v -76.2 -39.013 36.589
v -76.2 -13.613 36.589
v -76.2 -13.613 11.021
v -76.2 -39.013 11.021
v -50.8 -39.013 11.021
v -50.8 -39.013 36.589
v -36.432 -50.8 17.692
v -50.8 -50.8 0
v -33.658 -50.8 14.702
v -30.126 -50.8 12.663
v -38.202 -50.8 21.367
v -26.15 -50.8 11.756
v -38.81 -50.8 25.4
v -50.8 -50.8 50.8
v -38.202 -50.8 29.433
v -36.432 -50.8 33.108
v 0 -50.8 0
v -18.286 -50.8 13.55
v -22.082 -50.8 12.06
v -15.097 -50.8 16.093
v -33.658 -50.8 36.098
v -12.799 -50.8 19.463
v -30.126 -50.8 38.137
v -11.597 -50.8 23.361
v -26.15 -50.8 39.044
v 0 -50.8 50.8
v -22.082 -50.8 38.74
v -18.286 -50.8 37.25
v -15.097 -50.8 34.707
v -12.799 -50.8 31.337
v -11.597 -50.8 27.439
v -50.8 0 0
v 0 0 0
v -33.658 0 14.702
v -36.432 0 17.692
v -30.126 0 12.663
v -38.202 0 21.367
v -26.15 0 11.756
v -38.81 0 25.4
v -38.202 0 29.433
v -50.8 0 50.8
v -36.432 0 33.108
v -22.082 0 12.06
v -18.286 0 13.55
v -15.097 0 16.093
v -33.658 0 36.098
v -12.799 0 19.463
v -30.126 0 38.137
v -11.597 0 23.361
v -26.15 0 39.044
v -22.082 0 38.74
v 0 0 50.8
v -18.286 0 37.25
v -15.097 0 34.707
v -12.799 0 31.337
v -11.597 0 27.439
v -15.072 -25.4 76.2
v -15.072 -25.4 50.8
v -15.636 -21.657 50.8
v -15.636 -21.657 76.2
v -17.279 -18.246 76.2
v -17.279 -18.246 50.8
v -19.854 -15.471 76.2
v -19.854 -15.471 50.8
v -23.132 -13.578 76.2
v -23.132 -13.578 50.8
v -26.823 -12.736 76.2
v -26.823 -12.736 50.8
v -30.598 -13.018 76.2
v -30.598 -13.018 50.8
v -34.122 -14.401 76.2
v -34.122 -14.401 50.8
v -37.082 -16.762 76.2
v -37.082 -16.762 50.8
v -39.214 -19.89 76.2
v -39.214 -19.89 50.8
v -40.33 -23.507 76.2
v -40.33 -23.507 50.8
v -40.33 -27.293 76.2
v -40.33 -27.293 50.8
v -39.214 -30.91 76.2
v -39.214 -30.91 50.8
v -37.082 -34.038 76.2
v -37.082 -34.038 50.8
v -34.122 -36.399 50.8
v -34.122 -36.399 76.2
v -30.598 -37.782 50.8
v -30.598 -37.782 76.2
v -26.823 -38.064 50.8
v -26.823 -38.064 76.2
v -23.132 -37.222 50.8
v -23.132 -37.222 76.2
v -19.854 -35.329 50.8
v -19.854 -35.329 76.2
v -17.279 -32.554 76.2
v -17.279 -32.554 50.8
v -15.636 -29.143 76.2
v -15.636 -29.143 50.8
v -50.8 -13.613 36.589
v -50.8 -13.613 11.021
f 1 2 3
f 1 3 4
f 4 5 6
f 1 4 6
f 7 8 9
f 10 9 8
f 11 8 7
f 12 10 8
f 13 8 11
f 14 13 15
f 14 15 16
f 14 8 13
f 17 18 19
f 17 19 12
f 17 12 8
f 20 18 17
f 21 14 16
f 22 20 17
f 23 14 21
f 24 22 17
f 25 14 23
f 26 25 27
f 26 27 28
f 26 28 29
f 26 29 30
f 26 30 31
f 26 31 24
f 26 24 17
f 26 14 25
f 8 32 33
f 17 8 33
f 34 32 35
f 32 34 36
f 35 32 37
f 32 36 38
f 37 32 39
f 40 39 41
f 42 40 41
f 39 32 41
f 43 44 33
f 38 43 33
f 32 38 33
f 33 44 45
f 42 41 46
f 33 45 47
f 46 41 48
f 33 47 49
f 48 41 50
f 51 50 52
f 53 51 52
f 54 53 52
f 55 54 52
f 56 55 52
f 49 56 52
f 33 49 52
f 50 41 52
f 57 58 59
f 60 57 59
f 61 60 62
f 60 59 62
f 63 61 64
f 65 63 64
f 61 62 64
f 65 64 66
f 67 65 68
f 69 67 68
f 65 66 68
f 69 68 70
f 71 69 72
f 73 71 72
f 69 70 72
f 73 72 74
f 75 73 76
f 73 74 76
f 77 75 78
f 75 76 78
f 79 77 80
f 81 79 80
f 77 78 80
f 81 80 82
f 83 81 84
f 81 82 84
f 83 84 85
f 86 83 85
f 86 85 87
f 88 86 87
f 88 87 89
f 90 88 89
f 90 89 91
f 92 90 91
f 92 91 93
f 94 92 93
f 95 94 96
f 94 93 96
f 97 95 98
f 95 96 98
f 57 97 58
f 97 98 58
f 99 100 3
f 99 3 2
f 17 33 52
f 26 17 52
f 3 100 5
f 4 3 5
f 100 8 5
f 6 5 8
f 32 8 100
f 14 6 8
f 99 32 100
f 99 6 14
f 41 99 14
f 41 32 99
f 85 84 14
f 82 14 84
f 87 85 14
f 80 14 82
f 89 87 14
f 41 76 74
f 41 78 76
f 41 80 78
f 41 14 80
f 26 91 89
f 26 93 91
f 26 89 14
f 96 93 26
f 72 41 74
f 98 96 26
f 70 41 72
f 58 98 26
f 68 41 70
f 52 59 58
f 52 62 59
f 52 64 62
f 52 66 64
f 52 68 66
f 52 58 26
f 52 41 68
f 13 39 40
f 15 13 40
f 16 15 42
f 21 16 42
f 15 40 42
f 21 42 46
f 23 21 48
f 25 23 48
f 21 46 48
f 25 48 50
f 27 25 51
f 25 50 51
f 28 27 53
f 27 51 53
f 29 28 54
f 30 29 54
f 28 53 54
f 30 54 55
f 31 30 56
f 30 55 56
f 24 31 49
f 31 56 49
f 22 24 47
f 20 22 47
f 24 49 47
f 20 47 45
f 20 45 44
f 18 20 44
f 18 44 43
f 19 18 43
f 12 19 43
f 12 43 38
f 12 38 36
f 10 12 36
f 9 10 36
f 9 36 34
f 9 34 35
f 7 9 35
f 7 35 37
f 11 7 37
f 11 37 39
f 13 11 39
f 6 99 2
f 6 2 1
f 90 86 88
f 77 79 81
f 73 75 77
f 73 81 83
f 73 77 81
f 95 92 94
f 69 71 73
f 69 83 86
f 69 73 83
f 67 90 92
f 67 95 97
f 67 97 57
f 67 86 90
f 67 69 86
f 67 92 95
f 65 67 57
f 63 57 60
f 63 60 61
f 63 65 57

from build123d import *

# Parameters (mm, degrees)
F0_W      = 50.8
F0_H      = 50.8
F0_R      = 12.7
F1_DEPTH  = 50.8
F2_R      = 13.682638
F3_DEPTH  = 25.4
F3_FACE_R = 13.682638
F4_DEPTH  = 25.4
F5_W      = 25.4
F5_H      = 25.56793
F6_DEPTH  = 25.4
F7_R      = 12.7
F8_DEPTH  = 25.4


with BuildPart() as f1:
    # F0 (on Front) → F1 (new body)
    with BuildSketch(Plane.XZ):
        with Locations((-25.4, 25.4)):
            Rectangle(F0_W, F0_H)
        with Locations((-26.229173, 23.804629)):
            Circle(F0_R, mode=Mode.SUBTRACT)
        with Locations((-26.229173, 23.804629)):
            Circle(F0_R)
    extrude(amount=F1_DEPTH)

    # F2 (on face) → F3 (cut)
    with BuildSketch(Plane(origin=(0, 0, 0), x_dir=(-1, 0, 0), z_dir=(0, 1, 0))):
        with Locations((25.127107, 25.4)):
            Circle(F2_R)
    extrude(amount=-F3_DEPTH, mode=Mode.SUBTRACT)

    # F3_face (on face) → F4 (cut)
    with BuildSketch(Plane(origin=(-25.127107, -25.4, 25.4), x_dir=(-1, 0, 0), z_dir=(0, 1, 0))):
        Circle(F3_FACE_R)
    extrude(amount=-F4_DEPTH, mode=Mode.SUBTRACT)

    # F5 (on face) → F6 (join)
    with BuildSketch(Plane(origin=(-50.8, 0, 0), x_dir=(0, -1, 0), z_dir=(-1, 0, 0))):
        with Locations((26.313143, 23.804629)):
            Rectangle(F5_W, F5_H)
    extrude(amount=F6_DEPTH)

    # F7 (on face) → F8 (join)
    with BuildSketch(Plane.XY.offset(50.8)):
        with Locations((-27.772067, -25.4)):
            Circle(F7_R)
    extrude(amount=F8_DEPTH)


solid = f1.part
